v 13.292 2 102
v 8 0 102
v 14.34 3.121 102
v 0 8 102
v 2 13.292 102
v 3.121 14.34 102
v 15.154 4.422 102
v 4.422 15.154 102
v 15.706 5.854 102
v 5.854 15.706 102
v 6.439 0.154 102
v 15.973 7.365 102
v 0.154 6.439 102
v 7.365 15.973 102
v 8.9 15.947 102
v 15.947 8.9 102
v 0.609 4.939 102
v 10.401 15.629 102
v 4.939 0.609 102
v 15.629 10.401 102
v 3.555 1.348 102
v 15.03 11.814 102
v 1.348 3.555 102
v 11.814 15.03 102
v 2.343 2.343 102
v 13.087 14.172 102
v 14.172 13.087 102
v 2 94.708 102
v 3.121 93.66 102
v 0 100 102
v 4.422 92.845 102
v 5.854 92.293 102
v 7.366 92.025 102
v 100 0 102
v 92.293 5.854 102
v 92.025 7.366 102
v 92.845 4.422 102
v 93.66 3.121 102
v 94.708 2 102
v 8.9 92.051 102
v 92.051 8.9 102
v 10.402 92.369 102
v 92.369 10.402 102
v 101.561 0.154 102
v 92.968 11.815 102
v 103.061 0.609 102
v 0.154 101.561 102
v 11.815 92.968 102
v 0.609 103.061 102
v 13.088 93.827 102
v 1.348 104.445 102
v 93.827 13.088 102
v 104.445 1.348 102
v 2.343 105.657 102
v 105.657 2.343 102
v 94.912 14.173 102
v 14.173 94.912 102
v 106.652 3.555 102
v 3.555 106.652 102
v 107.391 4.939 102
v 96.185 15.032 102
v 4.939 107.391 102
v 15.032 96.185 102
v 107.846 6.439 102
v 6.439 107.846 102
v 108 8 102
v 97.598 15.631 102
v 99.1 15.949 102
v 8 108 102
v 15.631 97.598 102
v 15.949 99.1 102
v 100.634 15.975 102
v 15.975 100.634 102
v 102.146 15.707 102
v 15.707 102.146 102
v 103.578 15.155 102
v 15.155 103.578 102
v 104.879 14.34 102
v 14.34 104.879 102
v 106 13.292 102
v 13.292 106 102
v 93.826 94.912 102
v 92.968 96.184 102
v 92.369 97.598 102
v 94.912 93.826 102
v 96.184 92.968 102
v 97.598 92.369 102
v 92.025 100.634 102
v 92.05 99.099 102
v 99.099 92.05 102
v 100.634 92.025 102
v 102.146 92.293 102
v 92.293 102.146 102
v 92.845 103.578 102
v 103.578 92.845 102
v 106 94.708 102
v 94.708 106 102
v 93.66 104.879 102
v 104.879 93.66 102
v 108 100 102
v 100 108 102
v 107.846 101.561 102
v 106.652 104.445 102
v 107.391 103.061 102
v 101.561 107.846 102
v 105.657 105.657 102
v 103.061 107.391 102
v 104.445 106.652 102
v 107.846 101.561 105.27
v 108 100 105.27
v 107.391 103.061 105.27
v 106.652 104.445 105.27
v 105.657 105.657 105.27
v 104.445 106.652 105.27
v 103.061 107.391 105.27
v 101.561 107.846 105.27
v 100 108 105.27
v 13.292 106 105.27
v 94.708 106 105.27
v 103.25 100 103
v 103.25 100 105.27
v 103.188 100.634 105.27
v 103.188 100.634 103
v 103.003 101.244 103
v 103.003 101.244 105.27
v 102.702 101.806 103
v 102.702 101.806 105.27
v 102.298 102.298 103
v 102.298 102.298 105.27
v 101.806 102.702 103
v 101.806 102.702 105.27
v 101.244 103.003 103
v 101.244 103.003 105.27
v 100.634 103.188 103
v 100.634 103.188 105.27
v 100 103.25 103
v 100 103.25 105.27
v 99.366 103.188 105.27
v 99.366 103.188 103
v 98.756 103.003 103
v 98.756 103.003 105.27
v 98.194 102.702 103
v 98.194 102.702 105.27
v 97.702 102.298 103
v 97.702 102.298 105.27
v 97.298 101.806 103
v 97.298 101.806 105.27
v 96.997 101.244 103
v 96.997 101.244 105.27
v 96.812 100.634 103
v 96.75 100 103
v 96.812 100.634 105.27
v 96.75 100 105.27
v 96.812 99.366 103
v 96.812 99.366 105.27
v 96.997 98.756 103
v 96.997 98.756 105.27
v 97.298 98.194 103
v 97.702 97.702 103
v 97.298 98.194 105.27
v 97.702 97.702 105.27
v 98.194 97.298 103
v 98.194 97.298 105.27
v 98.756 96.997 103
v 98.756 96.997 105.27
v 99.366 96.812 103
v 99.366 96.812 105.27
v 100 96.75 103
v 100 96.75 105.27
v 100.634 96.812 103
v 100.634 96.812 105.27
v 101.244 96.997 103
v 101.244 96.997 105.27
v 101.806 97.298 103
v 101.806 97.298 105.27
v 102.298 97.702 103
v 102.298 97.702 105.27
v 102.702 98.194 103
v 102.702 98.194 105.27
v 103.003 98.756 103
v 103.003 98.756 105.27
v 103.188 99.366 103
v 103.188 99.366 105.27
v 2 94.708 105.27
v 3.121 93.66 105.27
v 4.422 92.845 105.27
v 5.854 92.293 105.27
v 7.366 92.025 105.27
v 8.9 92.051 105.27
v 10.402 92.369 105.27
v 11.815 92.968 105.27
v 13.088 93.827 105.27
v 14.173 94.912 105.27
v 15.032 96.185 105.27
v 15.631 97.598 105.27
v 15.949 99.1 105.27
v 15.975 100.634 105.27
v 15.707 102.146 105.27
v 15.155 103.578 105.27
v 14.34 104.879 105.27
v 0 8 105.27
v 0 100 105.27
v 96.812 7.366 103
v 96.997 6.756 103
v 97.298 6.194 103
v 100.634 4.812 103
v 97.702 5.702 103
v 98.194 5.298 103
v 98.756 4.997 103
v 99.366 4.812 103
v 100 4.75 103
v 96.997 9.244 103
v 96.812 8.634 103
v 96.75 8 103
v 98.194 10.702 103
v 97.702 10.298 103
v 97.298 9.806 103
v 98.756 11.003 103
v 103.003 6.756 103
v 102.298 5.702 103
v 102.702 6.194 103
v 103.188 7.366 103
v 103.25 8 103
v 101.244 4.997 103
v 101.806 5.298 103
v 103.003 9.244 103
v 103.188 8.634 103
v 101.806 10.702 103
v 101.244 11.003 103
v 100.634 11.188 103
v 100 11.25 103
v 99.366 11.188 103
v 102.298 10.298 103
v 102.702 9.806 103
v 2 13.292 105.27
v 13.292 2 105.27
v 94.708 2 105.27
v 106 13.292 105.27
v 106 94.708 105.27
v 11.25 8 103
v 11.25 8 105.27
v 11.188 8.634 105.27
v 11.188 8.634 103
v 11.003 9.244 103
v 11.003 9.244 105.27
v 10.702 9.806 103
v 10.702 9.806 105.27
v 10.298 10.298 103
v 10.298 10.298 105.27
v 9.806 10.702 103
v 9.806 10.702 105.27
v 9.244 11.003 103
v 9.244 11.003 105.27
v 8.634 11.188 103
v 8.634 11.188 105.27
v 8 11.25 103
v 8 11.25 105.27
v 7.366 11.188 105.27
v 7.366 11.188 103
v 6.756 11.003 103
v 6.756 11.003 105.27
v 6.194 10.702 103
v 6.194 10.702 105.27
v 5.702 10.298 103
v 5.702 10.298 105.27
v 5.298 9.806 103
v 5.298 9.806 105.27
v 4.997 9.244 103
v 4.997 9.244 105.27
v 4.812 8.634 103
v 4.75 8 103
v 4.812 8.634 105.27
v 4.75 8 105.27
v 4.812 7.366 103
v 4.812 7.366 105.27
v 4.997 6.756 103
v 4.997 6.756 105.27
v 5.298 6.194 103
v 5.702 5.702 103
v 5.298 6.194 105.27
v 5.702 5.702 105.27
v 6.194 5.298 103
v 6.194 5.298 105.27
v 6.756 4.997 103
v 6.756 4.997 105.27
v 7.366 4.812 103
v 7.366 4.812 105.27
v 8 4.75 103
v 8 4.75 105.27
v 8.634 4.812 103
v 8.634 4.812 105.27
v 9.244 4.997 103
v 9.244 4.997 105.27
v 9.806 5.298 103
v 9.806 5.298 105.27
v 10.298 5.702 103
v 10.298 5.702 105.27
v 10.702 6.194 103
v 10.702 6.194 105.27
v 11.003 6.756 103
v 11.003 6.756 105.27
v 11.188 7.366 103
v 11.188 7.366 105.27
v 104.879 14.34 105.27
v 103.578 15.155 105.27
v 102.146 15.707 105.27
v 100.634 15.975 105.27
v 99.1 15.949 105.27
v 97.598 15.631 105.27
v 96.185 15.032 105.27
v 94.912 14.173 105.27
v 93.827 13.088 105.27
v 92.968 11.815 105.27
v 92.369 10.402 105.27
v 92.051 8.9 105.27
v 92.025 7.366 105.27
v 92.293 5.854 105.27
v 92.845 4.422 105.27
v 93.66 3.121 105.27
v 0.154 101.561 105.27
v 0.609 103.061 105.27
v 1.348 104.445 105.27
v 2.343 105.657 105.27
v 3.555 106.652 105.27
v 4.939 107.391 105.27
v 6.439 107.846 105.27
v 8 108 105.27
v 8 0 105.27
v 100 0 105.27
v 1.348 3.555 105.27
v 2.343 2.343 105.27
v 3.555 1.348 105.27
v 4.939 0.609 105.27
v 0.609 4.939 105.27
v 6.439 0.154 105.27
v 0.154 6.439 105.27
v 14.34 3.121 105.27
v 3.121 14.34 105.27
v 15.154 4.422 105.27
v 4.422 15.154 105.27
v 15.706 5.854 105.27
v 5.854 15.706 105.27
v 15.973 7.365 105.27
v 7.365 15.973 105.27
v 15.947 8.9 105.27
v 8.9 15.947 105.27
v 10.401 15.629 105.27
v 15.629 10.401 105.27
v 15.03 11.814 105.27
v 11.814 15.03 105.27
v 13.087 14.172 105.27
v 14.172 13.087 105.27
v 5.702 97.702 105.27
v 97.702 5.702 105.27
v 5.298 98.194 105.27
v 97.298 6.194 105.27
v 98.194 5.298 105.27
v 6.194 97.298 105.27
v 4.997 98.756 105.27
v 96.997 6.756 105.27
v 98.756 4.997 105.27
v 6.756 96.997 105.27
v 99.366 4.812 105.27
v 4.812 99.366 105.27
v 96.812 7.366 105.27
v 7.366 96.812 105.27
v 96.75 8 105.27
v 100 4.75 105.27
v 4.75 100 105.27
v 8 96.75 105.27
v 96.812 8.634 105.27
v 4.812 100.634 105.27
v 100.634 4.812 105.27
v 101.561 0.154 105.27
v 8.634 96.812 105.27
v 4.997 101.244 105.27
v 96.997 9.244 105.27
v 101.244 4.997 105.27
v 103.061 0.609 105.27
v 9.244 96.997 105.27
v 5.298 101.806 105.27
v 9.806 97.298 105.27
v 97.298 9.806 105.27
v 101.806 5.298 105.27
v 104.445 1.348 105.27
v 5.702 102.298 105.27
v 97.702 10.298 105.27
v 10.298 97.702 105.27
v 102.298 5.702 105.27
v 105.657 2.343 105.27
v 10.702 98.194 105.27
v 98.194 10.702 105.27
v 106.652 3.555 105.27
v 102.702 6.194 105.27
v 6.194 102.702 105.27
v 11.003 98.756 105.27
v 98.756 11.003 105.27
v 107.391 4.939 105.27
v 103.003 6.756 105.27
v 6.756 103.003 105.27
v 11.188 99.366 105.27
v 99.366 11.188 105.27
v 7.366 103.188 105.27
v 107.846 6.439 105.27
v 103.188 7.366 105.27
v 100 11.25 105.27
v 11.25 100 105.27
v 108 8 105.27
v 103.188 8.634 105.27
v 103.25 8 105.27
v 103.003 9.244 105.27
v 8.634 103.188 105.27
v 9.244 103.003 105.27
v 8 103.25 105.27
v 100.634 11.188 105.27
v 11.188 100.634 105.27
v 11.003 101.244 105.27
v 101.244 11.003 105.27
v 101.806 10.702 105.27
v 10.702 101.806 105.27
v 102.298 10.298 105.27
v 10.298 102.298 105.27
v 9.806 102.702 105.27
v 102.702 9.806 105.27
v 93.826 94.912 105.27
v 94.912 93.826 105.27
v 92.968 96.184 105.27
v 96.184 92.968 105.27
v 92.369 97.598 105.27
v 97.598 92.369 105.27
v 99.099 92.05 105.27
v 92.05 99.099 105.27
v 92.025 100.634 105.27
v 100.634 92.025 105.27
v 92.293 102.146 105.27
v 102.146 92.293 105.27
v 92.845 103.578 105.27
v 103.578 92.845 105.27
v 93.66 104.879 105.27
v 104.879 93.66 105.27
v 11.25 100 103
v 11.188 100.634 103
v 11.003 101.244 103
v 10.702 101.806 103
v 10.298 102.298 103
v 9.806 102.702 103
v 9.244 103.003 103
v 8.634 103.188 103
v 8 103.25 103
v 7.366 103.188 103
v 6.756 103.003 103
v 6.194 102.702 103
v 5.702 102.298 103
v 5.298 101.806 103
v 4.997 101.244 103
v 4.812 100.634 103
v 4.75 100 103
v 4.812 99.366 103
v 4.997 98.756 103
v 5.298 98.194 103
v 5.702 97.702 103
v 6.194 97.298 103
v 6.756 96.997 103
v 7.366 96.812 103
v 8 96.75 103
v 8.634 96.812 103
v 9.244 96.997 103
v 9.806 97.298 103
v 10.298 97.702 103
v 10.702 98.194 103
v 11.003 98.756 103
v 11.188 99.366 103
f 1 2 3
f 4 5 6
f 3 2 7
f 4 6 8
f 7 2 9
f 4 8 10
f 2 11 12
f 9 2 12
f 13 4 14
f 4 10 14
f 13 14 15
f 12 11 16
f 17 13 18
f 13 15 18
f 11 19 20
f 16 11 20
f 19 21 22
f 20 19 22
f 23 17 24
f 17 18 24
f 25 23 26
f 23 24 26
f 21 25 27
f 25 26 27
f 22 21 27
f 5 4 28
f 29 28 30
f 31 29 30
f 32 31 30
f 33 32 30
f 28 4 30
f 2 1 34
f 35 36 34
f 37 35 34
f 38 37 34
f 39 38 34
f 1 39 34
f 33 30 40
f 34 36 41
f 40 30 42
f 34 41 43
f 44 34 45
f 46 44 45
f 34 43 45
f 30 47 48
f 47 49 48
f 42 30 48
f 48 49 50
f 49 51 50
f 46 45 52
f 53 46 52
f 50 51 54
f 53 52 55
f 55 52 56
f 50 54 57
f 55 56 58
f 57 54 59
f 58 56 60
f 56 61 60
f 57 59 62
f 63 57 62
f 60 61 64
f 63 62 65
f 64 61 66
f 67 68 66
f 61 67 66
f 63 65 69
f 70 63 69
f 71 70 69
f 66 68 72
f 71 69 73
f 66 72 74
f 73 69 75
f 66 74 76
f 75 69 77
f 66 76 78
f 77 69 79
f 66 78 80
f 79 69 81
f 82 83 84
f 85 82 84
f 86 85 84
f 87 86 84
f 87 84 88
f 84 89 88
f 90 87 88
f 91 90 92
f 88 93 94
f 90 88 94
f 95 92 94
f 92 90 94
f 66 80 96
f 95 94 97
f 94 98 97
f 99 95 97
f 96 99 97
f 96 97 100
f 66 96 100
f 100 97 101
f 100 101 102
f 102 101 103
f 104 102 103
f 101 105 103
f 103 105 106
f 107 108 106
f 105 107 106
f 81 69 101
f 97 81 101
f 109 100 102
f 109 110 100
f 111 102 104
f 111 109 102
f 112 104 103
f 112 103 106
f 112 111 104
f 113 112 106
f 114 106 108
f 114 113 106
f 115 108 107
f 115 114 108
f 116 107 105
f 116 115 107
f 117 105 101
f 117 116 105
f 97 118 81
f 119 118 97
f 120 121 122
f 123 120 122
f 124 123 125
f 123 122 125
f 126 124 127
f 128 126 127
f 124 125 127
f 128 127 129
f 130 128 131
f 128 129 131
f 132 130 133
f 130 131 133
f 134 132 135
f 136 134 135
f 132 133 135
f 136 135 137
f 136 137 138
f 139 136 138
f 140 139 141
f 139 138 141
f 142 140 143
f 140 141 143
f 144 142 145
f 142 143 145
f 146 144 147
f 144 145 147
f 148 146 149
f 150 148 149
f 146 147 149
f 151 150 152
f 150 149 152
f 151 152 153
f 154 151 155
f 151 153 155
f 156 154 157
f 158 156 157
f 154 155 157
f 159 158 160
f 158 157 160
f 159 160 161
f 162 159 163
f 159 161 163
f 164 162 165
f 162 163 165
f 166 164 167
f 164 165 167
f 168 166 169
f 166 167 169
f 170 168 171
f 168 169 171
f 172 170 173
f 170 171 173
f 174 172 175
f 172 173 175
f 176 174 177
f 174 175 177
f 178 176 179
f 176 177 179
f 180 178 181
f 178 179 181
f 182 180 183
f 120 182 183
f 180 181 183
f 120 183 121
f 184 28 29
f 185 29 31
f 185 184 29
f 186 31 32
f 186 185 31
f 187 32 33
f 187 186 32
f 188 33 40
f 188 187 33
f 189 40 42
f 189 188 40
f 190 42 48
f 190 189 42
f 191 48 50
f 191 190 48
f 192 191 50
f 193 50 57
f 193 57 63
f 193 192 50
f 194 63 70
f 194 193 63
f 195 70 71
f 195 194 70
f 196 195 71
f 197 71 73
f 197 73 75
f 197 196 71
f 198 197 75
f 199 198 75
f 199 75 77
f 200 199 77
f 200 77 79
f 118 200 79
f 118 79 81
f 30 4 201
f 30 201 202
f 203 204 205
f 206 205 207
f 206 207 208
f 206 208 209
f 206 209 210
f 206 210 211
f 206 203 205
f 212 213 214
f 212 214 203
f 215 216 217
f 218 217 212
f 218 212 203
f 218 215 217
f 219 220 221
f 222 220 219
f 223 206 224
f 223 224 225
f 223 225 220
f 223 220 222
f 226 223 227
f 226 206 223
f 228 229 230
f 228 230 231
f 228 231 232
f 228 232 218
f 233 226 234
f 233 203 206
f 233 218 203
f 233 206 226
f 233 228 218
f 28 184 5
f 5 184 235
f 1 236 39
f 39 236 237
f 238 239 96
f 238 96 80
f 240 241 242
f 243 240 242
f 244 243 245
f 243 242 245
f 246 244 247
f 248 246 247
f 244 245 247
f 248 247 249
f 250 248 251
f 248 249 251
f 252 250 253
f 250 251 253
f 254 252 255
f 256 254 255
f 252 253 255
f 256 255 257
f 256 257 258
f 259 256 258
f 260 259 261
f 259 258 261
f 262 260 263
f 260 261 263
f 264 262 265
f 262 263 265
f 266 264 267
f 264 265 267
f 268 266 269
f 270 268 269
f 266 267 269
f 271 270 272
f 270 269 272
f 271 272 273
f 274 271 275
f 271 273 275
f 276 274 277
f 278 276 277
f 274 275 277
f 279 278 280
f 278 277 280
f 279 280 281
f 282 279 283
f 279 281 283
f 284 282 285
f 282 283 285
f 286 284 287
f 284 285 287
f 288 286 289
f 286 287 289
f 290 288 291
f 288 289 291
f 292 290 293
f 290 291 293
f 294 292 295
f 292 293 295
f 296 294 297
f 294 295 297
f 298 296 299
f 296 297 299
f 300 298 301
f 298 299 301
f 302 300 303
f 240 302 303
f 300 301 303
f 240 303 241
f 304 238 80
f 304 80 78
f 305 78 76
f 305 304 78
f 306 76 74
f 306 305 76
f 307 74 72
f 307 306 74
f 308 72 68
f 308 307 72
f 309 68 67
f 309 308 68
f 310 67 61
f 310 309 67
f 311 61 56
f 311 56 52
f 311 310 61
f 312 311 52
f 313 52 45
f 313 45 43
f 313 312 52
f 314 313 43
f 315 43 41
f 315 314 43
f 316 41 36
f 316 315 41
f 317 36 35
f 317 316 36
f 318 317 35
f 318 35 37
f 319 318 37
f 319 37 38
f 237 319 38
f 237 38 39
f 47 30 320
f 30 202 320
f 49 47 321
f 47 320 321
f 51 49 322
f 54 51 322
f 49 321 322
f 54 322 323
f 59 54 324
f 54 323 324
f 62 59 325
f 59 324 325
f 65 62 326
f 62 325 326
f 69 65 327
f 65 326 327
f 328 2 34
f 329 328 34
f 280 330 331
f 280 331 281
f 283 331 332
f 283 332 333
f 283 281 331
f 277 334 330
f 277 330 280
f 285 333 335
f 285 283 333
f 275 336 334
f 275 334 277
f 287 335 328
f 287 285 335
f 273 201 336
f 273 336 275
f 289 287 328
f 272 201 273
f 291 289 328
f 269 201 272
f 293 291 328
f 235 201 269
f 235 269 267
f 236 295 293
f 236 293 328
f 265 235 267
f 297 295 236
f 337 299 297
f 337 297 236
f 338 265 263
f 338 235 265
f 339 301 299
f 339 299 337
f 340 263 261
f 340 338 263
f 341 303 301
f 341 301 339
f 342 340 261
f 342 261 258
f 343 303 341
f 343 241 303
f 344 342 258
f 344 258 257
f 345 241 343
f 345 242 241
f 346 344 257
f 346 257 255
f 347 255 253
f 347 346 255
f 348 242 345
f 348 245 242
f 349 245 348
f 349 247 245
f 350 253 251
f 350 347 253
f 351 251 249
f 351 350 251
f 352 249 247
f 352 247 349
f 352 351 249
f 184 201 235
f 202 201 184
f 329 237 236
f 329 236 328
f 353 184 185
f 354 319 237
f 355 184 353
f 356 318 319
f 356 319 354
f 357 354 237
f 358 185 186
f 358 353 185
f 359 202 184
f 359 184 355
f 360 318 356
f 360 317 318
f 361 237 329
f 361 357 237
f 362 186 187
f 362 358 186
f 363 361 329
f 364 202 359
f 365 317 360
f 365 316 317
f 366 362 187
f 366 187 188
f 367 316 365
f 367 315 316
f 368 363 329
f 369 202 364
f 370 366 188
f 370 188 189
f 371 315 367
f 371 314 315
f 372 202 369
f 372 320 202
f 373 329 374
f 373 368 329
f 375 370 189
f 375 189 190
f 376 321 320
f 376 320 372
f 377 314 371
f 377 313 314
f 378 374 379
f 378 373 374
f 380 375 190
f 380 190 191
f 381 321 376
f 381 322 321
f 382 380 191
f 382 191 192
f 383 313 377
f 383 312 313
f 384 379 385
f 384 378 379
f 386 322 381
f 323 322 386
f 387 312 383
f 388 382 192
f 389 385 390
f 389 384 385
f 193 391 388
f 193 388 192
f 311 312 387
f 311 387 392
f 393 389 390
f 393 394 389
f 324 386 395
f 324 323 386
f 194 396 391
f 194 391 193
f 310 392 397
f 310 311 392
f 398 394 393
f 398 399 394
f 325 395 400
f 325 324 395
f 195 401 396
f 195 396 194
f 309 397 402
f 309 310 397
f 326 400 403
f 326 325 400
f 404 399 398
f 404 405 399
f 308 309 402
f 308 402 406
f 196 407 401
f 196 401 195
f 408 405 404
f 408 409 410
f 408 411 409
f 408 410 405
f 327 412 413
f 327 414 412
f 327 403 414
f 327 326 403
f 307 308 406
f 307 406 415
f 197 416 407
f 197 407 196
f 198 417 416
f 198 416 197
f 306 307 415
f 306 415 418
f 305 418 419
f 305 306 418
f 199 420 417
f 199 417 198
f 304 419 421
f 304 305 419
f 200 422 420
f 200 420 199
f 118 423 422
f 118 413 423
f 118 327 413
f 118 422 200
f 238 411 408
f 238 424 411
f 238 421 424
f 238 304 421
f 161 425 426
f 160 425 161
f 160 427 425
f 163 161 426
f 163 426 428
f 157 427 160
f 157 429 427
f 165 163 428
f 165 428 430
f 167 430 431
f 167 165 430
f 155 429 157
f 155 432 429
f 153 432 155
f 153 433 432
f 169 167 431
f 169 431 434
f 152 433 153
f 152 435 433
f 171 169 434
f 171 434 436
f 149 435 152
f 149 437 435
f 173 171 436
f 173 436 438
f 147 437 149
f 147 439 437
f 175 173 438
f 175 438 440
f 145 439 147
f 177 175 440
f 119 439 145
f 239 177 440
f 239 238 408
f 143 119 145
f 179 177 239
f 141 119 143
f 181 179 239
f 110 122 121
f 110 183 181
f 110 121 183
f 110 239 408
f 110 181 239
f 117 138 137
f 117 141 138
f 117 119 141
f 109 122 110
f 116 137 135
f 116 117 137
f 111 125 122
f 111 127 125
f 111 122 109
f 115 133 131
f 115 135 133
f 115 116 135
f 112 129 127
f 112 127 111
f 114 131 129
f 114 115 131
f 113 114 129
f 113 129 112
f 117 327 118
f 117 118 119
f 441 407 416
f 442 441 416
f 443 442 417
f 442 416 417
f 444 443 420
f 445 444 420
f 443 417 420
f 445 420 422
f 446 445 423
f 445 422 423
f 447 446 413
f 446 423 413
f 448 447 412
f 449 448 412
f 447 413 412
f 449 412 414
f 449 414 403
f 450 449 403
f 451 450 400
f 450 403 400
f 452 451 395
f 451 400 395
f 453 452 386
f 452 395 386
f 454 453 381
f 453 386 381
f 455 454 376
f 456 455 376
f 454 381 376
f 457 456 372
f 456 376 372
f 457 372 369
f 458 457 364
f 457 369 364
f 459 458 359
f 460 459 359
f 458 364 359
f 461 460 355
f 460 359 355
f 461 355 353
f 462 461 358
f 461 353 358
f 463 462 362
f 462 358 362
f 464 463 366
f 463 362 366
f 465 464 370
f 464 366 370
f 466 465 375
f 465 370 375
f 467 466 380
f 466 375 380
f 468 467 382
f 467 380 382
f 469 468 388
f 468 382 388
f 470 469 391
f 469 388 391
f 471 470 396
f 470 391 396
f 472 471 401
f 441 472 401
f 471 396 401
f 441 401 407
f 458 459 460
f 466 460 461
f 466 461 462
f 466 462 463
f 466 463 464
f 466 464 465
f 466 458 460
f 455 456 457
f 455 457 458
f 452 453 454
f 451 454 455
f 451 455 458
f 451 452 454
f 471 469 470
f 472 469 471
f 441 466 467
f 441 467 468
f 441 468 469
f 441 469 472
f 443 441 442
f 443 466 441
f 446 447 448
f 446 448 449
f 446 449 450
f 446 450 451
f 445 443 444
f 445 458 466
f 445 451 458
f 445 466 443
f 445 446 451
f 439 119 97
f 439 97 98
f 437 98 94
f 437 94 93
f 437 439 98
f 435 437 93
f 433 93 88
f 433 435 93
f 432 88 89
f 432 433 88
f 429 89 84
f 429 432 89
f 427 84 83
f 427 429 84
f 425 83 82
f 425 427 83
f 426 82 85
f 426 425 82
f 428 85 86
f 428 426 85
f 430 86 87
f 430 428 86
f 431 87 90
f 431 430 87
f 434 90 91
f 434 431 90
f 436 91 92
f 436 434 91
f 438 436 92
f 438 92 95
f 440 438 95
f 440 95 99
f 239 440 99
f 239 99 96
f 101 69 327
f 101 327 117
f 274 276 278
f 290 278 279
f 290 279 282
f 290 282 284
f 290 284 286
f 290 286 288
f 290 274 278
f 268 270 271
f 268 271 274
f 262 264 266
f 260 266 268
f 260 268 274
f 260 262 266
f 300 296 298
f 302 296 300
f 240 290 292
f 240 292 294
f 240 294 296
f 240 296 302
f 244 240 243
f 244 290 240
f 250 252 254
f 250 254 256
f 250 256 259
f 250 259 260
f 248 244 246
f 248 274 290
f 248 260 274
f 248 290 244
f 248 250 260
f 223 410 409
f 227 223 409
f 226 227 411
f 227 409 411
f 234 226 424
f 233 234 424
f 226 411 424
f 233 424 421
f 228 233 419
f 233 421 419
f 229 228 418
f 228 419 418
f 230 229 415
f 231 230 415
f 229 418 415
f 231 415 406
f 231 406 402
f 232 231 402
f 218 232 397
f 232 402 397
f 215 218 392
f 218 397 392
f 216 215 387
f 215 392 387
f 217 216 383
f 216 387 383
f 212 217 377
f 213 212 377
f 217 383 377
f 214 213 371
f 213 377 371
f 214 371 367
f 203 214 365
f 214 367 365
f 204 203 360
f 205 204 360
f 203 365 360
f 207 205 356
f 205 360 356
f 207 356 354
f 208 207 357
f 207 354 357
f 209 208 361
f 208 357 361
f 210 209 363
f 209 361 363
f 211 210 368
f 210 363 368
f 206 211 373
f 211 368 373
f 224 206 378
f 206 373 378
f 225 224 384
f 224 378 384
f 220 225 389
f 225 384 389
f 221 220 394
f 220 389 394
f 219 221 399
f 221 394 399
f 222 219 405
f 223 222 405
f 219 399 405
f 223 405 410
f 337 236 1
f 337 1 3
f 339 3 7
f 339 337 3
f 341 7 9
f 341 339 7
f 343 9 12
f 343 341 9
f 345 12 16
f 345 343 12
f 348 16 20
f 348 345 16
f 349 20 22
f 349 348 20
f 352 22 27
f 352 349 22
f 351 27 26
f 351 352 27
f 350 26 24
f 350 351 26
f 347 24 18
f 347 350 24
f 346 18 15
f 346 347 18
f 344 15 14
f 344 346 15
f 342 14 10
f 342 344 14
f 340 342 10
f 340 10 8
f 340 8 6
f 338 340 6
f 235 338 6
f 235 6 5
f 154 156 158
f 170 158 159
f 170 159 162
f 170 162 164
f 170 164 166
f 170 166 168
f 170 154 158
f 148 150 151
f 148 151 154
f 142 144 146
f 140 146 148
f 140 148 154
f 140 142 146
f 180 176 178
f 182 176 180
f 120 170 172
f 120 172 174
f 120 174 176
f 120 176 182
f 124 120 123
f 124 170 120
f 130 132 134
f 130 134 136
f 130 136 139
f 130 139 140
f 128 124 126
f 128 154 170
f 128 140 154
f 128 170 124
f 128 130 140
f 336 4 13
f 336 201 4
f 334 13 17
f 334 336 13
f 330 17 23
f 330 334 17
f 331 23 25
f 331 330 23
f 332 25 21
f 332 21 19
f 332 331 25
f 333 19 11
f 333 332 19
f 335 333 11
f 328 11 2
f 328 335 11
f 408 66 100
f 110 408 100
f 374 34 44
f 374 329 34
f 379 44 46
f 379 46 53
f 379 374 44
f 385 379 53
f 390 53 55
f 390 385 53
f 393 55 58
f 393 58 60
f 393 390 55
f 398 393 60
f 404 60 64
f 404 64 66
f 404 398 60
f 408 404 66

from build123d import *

# Parameters (mm, degrees)
SKETCH128_W     = 108
SKETCH128_H     = 108
PAD051_DEPTH    = 3.27
FILLET010_R     = 8
SKETCH129_R     = 3.25
POCKET051_DEPTH = 2.27
POCKET050_DEPTH = 3.271


with BuildPart() as part:
    # Sketch128 → Pad051 (new body)
    with BuildSketch(Plane.XY):
        with Locations((54, 54)):
            Rectangle(SKETCH128_W, SKETCH128_H)
    extrude(amount=PAD051_DEPTH)

    # Fillet010
    fillet010_edges = [part.edges().sort_by_distance(p)[0] for p in [
        (108, 0, 1.635),
        (108, 108, 1.635),
        (0, 108, 1.635),
        (0, 0, 1.635),
    ]]
    fillet(fillet010_edges, radius=FILLET010_R)

    # Sketch129 (on Face5 of Fillet010) → Pocket051 (cut)
    with BuildSketch(Plane.XY.offset(3.27)):
        with Locations((8, 8)):
            Circle(SKETCH129_R)
        with Locations((100, 8)):
            Circle(SKETCH129_R)
        with Locations((100, 100)):
            Circle(SKETCH129_R)
        with Locations((8, 100)):
            Circle(SKETCH129_R)
    extrude(amount=-POCKET051_DEPTH, mode=Mode.SUBTRACT)

    # Sketch130 (on Face5 of Pocket051) → Pocket050 (cut, through all)
    with BuildSketch(Plane.XY.offset(3.27)):
        with BuildLine():
            Line((2, 94.708497), (2, 13.291503))
            ThreePointArc((13.291503, 2), (13.655204, 13.655204), (2, 13.291503))
            Line((13.291503, 2), (94.708497, 2))
            ThreePointArc((106, 13.291503), (94.343146, 13.656854), (94.708497, 2))
            Line((106, 94.708497), (106, 13.291503))
            ThreePointArc((94.708497, 106), (94.342737, 94.342737), (106, 94.708497))
            Line((13.291503, 106), (94.708497, 106))
            ThreePointArc((2, 94.708497), (13.656854, 94.343146), (13.291503, 106))
        make_face()
    extrude(amount=-POCKET050_DEPTH, mode=Mode.SUBTRACT)


with BuildPart() as part_1:
    # Body023 placement: moved
    add(part.part.moved(Location((0, 0, 102))))


solid = part_1.part
